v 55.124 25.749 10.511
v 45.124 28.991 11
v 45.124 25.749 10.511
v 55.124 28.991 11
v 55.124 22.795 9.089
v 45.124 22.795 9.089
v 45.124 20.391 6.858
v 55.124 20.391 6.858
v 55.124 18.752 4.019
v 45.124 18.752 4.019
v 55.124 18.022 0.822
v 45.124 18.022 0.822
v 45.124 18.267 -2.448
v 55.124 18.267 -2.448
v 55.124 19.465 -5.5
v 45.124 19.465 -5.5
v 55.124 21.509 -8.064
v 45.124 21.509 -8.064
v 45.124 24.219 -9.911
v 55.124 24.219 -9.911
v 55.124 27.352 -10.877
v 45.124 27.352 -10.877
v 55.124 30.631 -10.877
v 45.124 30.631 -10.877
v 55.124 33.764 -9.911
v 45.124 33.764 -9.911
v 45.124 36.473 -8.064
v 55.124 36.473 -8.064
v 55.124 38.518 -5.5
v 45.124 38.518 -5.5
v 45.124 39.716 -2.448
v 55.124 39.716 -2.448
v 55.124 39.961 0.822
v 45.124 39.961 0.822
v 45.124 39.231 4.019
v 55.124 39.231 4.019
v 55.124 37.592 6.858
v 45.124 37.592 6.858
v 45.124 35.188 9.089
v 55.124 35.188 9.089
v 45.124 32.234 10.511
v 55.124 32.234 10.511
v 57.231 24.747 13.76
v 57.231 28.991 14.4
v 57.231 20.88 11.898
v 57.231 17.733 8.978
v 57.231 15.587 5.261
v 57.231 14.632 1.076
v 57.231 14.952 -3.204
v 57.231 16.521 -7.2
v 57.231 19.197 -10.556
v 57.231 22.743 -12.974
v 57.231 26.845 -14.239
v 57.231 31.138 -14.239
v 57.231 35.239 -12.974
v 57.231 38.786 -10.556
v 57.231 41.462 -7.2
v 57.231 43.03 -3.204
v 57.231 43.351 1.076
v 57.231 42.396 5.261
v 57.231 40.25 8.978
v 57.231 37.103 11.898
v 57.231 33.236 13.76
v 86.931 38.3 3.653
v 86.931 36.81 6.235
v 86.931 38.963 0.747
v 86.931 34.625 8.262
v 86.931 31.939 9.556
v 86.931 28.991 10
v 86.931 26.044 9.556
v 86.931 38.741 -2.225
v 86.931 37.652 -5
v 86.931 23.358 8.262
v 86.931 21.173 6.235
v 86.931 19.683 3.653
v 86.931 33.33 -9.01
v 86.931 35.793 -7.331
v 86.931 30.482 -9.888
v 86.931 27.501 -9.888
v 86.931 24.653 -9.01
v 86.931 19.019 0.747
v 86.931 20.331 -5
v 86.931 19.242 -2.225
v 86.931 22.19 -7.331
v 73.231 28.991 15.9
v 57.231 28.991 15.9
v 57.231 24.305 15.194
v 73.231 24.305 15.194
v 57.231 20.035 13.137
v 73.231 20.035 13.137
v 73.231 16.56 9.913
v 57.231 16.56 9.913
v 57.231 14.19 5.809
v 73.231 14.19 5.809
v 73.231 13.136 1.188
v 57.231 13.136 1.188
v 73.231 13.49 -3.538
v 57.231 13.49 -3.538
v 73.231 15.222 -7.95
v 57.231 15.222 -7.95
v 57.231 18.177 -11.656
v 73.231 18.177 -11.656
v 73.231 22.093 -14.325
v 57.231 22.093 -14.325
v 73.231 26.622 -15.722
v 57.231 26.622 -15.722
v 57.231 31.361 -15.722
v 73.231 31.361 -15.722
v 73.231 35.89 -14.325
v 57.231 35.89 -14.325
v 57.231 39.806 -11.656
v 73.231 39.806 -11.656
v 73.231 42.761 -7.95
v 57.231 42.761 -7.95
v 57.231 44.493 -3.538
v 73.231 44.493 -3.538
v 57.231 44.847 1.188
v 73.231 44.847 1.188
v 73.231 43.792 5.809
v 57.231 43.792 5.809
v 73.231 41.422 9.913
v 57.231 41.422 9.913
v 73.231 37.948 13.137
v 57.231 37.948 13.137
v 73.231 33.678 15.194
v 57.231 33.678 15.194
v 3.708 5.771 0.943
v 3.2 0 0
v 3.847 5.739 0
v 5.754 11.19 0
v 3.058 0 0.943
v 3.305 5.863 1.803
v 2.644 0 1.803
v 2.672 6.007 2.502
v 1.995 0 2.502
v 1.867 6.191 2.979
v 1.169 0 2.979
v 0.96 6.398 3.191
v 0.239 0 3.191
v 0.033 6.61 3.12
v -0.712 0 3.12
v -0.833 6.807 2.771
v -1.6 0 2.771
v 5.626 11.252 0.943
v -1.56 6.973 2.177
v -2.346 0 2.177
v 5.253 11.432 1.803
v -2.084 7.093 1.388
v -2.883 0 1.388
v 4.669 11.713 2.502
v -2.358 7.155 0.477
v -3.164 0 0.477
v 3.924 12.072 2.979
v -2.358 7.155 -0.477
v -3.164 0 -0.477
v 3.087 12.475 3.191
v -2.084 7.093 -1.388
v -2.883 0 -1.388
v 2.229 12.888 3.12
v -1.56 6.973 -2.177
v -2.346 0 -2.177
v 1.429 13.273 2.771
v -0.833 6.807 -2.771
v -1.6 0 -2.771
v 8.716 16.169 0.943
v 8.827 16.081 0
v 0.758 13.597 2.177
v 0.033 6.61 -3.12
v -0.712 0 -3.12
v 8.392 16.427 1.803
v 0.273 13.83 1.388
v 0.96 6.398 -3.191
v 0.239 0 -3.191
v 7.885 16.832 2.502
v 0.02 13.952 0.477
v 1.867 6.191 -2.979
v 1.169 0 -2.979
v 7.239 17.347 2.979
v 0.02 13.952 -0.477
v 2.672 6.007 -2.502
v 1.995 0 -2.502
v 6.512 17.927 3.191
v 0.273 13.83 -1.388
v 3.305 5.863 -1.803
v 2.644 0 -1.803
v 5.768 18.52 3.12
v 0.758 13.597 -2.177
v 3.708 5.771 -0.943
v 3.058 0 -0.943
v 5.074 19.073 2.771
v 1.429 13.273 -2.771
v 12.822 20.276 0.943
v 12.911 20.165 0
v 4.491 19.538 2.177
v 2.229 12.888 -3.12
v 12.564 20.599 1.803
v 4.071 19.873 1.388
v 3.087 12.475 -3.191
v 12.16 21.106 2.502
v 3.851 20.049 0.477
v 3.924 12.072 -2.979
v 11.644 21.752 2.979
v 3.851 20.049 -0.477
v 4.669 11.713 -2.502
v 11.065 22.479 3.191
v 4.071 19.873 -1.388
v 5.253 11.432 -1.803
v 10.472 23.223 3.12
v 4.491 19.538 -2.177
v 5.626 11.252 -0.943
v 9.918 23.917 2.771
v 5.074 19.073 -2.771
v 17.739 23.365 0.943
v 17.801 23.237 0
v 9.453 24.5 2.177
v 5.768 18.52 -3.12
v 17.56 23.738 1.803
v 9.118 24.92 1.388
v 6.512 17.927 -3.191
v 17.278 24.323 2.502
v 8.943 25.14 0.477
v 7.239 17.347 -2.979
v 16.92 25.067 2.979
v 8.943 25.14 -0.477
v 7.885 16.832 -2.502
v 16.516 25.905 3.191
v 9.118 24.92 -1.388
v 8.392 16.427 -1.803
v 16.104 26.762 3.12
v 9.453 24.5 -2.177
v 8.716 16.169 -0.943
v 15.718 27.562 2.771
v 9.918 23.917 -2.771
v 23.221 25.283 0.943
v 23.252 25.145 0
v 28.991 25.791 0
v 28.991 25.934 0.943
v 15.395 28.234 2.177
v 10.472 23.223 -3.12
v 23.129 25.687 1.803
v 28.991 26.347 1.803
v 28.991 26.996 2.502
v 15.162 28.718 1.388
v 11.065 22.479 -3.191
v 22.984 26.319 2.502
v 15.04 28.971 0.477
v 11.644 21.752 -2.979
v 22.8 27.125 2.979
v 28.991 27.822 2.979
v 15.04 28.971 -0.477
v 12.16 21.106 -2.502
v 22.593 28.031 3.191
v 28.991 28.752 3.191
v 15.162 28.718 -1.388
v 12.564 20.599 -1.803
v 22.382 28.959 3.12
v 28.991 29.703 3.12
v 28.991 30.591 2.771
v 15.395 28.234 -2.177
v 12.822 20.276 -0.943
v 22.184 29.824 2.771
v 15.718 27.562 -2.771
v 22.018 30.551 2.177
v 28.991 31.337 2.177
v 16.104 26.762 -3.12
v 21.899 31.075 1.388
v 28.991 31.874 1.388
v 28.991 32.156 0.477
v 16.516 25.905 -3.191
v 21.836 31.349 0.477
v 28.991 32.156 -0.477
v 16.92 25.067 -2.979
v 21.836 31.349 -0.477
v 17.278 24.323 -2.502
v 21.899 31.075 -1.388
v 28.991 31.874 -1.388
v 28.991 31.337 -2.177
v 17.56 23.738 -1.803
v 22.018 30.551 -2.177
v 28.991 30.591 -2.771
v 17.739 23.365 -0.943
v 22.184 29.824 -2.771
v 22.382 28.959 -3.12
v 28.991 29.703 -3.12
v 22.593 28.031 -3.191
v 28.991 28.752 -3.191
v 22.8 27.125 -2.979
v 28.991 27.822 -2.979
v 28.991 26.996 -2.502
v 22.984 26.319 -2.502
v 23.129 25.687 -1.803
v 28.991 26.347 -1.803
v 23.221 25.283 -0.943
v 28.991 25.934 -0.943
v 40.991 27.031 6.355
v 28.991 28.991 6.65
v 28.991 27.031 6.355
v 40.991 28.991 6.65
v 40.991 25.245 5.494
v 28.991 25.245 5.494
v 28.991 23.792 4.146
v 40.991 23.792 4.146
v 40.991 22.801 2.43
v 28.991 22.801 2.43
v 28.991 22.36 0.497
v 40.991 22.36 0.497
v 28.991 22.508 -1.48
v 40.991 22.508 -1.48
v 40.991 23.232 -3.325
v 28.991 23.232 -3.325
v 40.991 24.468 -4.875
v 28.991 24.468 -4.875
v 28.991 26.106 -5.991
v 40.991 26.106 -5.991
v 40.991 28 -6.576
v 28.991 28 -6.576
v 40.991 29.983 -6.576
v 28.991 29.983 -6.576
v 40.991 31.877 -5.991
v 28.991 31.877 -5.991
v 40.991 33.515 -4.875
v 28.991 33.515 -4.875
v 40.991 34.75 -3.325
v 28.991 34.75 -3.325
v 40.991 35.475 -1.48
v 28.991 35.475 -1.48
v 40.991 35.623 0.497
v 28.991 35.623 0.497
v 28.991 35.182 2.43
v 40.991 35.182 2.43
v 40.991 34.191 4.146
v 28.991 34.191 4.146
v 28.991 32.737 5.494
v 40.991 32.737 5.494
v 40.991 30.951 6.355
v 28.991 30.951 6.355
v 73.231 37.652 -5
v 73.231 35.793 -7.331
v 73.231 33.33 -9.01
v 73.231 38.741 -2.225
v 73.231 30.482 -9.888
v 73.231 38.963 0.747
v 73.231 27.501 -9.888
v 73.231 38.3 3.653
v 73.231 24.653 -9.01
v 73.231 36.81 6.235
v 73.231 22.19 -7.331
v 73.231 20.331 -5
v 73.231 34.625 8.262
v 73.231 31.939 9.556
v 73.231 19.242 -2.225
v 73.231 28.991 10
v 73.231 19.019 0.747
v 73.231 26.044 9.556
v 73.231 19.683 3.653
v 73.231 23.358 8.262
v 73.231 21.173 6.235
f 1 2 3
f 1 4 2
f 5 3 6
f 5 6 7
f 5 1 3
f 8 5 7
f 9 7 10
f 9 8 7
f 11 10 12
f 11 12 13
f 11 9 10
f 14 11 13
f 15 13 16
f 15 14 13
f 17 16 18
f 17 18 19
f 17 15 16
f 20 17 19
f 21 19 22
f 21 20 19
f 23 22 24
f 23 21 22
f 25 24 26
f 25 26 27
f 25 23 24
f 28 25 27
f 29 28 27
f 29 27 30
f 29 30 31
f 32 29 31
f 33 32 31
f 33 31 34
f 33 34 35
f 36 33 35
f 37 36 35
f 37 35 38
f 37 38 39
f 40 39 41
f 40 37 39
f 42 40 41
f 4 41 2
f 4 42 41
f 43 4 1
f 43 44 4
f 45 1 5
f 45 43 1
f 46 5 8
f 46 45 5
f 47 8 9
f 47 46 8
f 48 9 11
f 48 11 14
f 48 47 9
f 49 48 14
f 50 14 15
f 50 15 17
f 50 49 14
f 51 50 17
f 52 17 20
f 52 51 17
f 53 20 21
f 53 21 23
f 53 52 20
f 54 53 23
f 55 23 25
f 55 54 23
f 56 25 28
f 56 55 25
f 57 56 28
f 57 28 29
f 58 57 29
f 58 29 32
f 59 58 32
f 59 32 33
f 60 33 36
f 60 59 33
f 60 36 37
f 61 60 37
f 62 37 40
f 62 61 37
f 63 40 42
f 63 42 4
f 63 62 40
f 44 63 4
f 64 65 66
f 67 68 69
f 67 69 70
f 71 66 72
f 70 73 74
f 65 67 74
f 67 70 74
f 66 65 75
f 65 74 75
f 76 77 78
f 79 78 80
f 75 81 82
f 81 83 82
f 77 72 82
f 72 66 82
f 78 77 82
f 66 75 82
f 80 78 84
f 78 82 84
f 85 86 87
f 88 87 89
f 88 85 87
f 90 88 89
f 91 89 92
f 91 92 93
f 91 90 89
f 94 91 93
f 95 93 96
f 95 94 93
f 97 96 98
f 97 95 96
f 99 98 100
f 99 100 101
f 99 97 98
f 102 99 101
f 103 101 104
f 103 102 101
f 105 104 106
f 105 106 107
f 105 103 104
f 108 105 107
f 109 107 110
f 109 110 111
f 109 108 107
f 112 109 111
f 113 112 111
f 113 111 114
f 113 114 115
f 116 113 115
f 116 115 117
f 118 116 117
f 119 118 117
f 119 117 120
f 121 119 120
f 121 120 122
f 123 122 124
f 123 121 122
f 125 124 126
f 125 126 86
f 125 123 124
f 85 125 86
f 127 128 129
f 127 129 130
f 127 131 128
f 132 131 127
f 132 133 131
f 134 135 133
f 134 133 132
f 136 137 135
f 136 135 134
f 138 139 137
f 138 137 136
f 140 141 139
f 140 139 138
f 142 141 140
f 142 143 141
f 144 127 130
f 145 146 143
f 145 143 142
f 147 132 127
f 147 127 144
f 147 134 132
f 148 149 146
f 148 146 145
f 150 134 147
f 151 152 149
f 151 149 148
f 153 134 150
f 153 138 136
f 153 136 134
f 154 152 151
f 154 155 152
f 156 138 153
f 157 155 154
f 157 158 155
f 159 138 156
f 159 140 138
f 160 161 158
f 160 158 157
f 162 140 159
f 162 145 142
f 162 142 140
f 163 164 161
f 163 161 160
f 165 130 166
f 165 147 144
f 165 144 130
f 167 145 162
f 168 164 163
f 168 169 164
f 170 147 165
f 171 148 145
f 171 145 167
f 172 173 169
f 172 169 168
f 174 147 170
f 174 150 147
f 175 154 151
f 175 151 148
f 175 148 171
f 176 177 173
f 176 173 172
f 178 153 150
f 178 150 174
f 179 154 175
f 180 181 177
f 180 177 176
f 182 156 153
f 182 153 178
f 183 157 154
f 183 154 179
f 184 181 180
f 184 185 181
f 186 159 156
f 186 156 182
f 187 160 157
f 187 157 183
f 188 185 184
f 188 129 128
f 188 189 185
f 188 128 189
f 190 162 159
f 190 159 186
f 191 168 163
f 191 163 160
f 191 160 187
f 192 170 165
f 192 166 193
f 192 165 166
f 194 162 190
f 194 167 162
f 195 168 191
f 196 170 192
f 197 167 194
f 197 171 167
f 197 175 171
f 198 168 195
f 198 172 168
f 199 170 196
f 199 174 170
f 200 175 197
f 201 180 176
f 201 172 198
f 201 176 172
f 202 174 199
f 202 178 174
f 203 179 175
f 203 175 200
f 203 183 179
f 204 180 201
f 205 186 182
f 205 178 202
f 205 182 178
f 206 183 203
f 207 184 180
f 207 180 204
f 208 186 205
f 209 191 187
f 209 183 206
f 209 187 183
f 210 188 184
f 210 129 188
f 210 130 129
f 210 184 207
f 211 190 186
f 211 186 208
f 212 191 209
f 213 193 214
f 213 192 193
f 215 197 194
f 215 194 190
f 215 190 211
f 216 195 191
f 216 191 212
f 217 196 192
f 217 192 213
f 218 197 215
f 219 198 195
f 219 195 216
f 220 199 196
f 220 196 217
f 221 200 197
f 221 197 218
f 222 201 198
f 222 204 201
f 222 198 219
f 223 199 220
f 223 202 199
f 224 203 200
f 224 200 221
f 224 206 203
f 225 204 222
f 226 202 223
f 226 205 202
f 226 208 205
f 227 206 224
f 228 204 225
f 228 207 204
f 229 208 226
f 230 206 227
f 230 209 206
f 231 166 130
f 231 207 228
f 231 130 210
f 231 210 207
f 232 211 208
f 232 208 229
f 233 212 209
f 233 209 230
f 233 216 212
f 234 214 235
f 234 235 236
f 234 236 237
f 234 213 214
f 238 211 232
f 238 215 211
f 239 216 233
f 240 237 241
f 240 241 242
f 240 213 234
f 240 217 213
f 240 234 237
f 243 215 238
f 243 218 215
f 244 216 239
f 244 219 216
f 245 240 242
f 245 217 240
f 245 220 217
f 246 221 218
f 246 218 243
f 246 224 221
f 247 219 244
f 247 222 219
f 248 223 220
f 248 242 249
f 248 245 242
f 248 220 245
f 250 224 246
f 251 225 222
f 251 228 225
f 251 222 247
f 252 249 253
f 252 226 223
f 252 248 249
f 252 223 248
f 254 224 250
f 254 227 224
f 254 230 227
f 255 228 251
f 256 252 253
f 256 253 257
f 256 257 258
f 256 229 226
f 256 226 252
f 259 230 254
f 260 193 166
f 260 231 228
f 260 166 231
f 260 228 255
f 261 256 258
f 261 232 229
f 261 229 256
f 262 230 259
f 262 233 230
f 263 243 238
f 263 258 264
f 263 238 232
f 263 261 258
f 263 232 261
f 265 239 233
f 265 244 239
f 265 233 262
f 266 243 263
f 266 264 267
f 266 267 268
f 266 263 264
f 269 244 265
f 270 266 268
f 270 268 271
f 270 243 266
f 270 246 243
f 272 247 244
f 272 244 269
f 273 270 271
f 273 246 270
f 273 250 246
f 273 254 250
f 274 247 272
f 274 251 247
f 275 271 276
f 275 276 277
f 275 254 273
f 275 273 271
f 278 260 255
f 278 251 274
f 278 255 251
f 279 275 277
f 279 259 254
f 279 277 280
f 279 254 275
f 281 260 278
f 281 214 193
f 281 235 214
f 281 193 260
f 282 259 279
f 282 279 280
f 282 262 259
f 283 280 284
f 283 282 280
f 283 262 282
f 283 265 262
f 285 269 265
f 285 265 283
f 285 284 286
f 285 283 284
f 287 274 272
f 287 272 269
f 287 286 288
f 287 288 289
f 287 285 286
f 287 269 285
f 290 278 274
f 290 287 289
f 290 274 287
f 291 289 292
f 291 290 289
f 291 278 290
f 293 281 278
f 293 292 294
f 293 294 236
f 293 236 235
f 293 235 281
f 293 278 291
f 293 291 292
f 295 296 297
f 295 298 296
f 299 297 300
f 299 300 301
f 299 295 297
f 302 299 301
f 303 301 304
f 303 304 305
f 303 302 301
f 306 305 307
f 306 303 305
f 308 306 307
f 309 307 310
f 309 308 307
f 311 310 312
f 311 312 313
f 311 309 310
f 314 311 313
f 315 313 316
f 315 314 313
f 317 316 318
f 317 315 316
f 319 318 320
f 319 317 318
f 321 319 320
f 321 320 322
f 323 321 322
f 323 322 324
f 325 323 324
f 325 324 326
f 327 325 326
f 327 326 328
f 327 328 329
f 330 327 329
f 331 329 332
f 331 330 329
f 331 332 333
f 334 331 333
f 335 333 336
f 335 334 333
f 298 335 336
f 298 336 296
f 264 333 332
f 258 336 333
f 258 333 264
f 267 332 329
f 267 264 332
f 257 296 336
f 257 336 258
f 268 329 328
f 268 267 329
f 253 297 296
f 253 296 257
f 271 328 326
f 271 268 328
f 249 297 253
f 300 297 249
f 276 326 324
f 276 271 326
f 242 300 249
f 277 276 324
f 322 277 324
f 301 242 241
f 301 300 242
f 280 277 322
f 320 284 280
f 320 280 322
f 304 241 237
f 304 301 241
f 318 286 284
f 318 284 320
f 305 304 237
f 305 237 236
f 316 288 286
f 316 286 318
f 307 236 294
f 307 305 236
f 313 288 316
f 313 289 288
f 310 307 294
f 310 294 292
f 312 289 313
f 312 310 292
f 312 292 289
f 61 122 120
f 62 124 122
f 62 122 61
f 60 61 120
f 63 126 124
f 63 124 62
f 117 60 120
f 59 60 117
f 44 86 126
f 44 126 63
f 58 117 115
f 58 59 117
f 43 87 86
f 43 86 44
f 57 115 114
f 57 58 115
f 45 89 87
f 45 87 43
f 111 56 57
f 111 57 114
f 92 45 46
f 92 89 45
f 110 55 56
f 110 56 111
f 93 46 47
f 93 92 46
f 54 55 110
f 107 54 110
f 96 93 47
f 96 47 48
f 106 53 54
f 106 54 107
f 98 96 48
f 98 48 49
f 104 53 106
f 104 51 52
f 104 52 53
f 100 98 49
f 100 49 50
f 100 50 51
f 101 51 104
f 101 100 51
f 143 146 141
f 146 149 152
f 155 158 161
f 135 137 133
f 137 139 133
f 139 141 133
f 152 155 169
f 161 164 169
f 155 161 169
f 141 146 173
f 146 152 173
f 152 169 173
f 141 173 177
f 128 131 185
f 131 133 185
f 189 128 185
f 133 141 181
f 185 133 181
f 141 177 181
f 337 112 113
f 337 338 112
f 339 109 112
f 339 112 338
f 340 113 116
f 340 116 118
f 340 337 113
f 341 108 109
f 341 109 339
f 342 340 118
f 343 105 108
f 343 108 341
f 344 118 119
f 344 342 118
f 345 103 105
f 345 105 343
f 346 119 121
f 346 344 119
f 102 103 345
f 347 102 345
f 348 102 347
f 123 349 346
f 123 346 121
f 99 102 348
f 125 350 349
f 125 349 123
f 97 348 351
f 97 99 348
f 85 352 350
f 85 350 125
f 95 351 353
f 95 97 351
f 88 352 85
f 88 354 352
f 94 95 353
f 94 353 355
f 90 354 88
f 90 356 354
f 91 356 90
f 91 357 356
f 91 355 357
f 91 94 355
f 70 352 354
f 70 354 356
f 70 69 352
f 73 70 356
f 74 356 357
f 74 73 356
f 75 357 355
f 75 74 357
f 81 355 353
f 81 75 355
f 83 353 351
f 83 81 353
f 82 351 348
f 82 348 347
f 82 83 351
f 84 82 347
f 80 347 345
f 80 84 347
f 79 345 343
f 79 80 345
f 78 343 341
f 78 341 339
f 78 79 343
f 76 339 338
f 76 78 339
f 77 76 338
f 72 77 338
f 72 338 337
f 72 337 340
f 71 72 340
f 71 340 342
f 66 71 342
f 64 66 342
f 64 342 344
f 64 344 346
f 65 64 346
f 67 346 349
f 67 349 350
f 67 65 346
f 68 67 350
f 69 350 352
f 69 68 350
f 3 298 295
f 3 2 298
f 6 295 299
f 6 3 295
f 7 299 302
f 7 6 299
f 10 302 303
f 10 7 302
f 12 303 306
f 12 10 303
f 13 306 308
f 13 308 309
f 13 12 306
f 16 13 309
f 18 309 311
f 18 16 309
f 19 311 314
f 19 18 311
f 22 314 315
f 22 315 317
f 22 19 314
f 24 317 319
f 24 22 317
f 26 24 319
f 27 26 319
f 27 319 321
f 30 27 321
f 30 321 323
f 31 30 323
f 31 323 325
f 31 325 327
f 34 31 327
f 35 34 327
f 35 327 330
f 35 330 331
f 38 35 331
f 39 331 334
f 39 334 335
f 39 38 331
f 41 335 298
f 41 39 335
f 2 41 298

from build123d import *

# Parameters (mm, degrees)
SKETCH2_R   = 3.2
SKETCH4_W   = 12
SKETCH4_H   = 6.65
SKETCH4_W_2 = 13.7
SKETCH4_H_2 = 10


with BuildPart() as part:
    # Sweep1: sweep along a path in Sketch1
    with BuildLine(Plane.XY) as sweep1_path:
        ThreePointArc((0, 0), (8.491378029, 20.5), (28.991378029, 28.991378029))
    # Sketch2 → Sweep1 (sweep)
    with BuildSketch(Plane(origin=(0, 0, 0), x_dir=(1, 0, 0), z_dir=(0, 1, 0))):
        Circle(SKETCH2_R)
    sweep(path=sweep1_path.line)

    # Sketch4 → Revolve1 (revolve)
    with BuildSketch(Plane.XY, mode=Mode.PRIVATE) as revolve1_sk:
        with Locations((34.991378029, 32.316378029)):
            Rectangle(SKETCH4_W, SKETCH4_H)
        Polygon((55.123871223, 28.991378029), (40.991378029, 28.991378029), (40.991378029, 35.641378029), (45.123871223, 39.991378029), (55.123871223, 39.991378029), align=None)
        Polygon((73.231001973, 28.991378029), (55.123871223, 28.991378029), (55.123871223, 39.991378029), (57.231001973, 43.391378029), (57.231001973, 44.891378029), (73.231001973, 44.891378029), align=None)
        with Locations((80.081001973, 33.991378029)):
            Rectangle(SKETCH4_W_2, SKETCH4_H_2)
    revolve(revolve1_sk.sketch.rotate(Axis((28.991378029, 28.991378029, 0), (1, 0, 0)), 90), axis=Axis((28.991378029, 28.991378029, 0), (1, 0, 0)))  # turned: the seam where the file's is


solid = part.part
